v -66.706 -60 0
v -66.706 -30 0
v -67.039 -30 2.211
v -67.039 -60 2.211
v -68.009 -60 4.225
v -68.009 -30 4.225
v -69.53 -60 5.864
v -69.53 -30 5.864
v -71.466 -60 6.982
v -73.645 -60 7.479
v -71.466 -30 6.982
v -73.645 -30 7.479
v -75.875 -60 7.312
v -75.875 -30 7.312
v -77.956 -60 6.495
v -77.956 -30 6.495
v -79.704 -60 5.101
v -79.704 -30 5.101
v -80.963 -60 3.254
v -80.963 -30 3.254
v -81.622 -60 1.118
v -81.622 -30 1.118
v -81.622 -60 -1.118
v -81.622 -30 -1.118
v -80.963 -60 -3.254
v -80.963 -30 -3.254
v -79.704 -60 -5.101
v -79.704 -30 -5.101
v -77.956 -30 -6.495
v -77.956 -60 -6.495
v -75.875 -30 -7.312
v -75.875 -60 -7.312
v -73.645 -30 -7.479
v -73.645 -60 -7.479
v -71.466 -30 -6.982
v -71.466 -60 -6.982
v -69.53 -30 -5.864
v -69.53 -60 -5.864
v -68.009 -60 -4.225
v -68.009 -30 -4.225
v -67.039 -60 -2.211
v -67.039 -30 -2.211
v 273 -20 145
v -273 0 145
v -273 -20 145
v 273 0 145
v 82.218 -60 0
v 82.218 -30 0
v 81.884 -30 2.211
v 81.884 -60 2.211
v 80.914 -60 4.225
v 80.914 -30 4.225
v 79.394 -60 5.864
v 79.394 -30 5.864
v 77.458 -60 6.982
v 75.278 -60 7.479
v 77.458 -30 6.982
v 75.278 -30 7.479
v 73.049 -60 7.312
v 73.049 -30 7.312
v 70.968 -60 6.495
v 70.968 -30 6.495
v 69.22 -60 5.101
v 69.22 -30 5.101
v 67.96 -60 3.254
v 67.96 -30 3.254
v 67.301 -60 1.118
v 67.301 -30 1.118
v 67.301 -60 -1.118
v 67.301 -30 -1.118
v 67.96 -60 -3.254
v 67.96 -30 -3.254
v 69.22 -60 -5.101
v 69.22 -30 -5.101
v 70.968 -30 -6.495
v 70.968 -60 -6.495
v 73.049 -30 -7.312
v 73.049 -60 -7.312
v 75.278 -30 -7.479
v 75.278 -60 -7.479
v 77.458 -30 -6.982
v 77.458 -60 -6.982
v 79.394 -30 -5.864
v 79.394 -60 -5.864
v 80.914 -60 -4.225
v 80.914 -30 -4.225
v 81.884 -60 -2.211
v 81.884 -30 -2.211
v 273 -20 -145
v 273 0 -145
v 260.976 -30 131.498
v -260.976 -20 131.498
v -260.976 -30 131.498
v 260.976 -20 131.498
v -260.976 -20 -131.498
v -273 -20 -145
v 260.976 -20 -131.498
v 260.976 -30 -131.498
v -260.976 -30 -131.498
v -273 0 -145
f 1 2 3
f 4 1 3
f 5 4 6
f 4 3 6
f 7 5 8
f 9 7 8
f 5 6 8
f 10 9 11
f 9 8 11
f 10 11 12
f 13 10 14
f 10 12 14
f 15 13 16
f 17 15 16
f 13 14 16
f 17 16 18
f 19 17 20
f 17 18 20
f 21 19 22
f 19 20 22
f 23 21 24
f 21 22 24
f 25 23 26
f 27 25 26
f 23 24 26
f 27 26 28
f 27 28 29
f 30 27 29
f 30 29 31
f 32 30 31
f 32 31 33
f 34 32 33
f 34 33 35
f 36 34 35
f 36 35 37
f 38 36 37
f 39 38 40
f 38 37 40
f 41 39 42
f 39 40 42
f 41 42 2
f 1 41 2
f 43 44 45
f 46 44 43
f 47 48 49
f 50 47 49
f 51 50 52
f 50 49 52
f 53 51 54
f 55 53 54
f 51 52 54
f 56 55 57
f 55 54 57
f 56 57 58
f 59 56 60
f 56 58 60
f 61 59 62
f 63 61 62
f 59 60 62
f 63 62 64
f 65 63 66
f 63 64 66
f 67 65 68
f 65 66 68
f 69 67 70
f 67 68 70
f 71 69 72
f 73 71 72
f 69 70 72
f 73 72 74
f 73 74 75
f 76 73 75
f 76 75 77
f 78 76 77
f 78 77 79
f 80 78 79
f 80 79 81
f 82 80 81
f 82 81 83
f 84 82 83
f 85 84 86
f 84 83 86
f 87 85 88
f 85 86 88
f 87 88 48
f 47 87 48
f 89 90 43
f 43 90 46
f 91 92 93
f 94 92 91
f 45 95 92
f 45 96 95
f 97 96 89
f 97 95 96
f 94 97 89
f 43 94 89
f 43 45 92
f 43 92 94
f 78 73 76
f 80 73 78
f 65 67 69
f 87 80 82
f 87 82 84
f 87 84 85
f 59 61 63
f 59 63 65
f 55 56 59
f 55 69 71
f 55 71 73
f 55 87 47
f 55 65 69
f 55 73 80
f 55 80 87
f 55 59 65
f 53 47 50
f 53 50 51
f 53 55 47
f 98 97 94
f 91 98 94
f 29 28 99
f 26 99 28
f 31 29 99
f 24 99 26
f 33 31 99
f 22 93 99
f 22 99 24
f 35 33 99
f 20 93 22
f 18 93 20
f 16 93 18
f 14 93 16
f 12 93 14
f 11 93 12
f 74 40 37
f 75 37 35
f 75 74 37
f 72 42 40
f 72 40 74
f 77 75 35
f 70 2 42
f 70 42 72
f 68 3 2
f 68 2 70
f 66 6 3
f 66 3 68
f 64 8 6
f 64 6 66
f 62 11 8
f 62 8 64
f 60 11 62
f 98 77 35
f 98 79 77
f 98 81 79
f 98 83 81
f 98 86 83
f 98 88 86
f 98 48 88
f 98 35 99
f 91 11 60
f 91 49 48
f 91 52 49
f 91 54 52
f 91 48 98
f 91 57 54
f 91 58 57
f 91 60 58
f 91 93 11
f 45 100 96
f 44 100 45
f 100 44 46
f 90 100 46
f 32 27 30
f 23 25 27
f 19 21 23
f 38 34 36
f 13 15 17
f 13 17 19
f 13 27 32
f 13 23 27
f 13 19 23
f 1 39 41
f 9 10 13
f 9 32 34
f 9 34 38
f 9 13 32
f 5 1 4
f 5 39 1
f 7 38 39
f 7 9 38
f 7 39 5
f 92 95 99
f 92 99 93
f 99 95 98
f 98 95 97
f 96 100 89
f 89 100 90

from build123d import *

# Parameters (mm, degrees)
F0_W     = 546
F0_H     = 290
F1_DEPTH = 20
F2_W     = 521.951318
F2_H     = 262.995124
F3_DEPTH = 10
F4_R     = 7.5
F5_DEPTH = 30


with BuildPart() as f1:
    # F0 (on Front) → F1 (new body)
    with BuildSketch(Plane.XZ):
        Rectangle(F0_W, F0_H)
    extrude(amount=F1_DEPTH)

    # F2 (on face) → F3 (join)
    with BuildSketch(Plane.XZ.offset(20)):
        Rectangle(F2_W, F2_H)
    extrude(amount=F3_DEPTH)

    # F4 (on face) → F5 (join)
    with BuildSketch(Plane.XZ.offset(30)):
        with Locations((-74.205883, 0)):
            Circle(F4_R)
        with Locations((74.717641, 0)):
            Circle(F4_R)
    extrude(amount=F5_DEPTH)


solid = f1.part
